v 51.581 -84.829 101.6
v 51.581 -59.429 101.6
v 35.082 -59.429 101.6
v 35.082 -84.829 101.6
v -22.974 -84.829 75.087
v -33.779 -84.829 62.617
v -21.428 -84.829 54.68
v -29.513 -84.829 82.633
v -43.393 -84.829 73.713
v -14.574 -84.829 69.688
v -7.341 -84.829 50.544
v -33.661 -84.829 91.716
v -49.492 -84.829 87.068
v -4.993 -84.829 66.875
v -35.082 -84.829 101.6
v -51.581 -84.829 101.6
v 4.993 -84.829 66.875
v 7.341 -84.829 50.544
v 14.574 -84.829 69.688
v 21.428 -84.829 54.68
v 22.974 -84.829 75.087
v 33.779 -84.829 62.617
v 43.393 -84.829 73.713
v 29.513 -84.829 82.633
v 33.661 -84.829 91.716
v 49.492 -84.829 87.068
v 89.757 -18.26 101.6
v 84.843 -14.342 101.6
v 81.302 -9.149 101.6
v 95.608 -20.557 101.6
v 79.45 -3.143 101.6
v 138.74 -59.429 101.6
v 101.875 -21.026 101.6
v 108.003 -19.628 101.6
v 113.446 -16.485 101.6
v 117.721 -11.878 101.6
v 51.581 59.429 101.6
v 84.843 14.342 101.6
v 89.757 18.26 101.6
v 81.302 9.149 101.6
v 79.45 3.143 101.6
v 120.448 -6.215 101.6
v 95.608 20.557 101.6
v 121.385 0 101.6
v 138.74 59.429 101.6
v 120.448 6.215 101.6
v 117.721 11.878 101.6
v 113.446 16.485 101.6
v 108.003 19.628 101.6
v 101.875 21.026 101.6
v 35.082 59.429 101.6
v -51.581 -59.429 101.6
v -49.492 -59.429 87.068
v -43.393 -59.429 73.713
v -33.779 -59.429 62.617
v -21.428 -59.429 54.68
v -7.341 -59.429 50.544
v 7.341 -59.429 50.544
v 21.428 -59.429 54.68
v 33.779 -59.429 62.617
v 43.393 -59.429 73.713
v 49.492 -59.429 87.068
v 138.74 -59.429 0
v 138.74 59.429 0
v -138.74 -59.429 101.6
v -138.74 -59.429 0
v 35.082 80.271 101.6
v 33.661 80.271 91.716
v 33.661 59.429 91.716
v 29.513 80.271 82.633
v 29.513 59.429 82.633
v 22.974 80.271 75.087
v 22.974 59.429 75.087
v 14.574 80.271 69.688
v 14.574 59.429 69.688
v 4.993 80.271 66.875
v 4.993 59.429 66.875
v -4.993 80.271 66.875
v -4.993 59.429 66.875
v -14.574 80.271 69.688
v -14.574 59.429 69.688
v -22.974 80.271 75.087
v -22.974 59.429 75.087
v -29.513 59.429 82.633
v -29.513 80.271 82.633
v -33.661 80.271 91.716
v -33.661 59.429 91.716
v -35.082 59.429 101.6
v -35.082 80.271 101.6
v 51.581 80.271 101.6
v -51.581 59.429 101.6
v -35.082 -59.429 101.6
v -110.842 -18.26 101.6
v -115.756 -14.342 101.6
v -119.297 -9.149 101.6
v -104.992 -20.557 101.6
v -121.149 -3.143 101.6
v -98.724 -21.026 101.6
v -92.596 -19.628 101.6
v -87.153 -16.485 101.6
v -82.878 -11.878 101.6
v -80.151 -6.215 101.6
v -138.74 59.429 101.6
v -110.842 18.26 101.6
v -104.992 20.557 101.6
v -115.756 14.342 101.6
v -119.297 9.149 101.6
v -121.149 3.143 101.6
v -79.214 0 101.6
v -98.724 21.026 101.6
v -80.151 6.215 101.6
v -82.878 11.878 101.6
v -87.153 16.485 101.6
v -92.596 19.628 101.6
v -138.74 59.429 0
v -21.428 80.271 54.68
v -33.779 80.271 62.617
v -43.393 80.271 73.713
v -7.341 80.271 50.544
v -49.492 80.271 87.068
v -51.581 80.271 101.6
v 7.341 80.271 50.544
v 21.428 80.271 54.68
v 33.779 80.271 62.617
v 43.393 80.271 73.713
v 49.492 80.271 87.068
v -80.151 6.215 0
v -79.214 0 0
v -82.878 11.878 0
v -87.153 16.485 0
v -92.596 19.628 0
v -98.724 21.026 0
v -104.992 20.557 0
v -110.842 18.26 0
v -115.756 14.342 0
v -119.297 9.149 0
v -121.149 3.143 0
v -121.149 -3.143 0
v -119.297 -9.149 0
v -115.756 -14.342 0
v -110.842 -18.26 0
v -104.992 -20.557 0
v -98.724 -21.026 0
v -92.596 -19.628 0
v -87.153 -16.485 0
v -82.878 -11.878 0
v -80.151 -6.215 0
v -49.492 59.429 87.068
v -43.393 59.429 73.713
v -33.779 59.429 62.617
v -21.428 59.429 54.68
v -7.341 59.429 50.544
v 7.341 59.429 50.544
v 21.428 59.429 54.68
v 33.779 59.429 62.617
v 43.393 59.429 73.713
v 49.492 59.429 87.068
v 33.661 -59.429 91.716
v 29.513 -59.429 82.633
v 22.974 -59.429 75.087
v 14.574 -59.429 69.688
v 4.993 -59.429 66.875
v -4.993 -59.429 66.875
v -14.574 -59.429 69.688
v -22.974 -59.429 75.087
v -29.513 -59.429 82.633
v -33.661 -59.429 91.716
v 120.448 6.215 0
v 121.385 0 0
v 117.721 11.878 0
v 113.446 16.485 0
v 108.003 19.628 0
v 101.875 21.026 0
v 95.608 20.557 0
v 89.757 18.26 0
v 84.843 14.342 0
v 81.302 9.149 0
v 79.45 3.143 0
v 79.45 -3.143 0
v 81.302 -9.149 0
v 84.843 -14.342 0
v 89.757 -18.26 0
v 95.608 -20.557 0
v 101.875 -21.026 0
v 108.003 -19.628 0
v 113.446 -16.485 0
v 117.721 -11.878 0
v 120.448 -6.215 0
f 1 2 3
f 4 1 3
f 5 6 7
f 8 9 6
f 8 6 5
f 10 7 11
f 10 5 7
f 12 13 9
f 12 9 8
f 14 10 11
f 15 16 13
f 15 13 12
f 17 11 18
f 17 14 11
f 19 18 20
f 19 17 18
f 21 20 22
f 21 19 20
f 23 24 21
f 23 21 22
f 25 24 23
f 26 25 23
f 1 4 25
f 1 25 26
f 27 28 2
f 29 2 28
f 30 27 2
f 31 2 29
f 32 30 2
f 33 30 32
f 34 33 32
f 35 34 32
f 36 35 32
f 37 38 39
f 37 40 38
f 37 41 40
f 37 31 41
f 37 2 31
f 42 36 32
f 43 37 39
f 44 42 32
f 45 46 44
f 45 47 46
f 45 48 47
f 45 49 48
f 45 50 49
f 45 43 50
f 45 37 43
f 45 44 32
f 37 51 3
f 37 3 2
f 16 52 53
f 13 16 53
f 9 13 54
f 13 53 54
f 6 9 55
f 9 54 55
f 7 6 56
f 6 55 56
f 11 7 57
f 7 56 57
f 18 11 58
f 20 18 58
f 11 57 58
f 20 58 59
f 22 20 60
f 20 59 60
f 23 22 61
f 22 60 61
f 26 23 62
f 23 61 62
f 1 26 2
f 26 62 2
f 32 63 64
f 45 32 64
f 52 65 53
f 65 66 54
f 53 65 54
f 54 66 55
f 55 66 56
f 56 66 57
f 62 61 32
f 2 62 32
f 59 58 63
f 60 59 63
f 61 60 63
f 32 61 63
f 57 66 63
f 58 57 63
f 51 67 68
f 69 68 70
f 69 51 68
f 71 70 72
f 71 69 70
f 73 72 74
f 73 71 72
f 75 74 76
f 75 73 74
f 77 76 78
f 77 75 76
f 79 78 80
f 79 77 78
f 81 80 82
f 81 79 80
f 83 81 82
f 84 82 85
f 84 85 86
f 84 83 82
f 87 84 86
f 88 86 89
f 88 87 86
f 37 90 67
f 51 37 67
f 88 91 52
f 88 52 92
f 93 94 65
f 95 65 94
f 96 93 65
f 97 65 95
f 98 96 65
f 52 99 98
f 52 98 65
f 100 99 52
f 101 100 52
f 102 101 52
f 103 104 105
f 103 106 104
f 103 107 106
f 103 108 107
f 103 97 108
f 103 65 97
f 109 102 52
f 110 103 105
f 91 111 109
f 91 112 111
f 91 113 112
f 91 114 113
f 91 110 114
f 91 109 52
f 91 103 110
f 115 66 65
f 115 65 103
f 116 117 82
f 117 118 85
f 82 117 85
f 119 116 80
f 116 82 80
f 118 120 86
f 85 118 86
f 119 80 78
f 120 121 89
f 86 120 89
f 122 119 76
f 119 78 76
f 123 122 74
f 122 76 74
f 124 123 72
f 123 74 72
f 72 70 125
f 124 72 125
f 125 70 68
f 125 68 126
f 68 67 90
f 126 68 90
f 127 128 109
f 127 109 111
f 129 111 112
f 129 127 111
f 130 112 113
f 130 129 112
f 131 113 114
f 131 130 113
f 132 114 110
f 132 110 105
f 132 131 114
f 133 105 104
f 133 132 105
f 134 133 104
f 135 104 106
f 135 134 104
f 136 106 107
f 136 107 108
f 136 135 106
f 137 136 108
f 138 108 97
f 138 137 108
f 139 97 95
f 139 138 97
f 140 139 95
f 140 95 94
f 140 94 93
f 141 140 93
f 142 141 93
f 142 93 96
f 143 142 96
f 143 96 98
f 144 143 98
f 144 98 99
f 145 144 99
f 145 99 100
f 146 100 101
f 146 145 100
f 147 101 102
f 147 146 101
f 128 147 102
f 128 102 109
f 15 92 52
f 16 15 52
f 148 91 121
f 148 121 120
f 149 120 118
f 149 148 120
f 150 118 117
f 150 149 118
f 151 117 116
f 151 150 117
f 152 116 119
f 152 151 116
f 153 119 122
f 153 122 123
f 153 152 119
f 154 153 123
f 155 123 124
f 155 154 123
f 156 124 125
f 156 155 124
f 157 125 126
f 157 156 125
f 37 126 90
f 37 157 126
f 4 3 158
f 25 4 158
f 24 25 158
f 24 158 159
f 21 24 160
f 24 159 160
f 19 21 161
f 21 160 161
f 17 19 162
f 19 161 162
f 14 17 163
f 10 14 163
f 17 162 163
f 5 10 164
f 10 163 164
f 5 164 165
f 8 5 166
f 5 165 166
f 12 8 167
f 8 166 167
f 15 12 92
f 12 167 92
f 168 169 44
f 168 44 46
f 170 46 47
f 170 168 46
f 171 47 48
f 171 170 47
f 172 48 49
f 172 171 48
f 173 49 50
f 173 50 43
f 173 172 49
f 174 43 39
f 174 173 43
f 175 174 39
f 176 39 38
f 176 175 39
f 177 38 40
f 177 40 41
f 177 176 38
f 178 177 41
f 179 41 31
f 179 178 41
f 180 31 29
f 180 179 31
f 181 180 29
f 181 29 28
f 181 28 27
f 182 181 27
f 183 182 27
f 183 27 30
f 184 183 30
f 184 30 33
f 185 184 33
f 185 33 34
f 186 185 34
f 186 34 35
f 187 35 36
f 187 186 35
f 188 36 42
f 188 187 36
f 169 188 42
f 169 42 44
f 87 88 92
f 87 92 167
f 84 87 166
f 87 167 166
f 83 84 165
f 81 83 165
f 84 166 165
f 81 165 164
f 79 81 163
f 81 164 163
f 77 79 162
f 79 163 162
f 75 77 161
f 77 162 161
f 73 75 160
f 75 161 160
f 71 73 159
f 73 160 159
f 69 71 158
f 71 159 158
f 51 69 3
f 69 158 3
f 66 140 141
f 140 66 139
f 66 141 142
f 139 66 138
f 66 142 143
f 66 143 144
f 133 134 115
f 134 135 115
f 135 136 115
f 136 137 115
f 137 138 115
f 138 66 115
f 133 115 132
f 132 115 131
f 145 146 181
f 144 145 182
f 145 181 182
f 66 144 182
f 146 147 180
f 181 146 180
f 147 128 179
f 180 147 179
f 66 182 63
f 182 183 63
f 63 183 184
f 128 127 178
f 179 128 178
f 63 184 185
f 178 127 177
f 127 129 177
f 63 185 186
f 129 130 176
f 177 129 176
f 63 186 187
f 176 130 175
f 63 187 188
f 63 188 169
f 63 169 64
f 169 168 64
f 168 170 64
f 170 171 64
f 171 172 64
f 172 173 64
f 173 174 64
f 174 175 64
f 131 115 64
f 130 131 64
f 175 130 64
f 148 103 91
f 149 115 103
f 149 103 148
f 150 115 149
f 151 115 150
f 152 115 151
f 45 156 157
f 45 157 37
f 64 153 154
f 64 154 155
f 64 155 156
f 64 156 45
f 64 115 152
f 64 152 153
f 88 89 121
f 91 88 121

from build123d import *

# Parameters (mm, degrees)
F0_W          = 277.48093
F0_H          = 118.857272
F0_R          = 21.085253
F1_DEPTH      = 101.6
F2_R          = 35.081805
F3_DEPTH      = 118.858272
F5_DEPTH      = 25.4
F5_DEPTH_BACK = 139.7


with BuildPart() as f1:
    # F0 (on Top) → F1 (new body)
    with BuildSketch(Plane.XY):
        Rectangle(F0_W, F0_H)
        with Locations((-100.299634, 0)):
            Circle(F0_R, mode=Mode.SUBTRACT)
        with Locations((100.299634, 0)):
            Circle(F0_R, mode=Mode.SUBTRACT)
    extrude(amount=F1_DEPTH)

    # F2 (on face) → F3 (cut, through all)
    with BuildSketch(Plane.XZ.offset(59.428636)):
        with Locations((0, 101.6)):
            Circle(F2_R)
    extrude(amount=-F3_DEPTH, mode=Mode.SUBTRACT)

    # F4 (on face) → F5 (join, two sides)
    with BuildSketch(Plane.XZ.offset(59.428636)) as f5_sk:
        with BuildLine():
            ThreePointArc((35.081805, 101.6), (0, 66.518195), (-35.081805, 101.6))
            Line((-35.081805, 101.6), (-51.581461, 101.6))
            ThreePointArc((-51.581461, 101.6), (0, 50.018539), (51.581461, 101.6))
            Line((51.581461, 101.6), (35.081805, 101.6))
        make_face()
    extrude(amount=F5_DEPTH)
    extrude(f5_sk.sketch, amount=-F5_DEPTH_BACK)


solid = f1.part
